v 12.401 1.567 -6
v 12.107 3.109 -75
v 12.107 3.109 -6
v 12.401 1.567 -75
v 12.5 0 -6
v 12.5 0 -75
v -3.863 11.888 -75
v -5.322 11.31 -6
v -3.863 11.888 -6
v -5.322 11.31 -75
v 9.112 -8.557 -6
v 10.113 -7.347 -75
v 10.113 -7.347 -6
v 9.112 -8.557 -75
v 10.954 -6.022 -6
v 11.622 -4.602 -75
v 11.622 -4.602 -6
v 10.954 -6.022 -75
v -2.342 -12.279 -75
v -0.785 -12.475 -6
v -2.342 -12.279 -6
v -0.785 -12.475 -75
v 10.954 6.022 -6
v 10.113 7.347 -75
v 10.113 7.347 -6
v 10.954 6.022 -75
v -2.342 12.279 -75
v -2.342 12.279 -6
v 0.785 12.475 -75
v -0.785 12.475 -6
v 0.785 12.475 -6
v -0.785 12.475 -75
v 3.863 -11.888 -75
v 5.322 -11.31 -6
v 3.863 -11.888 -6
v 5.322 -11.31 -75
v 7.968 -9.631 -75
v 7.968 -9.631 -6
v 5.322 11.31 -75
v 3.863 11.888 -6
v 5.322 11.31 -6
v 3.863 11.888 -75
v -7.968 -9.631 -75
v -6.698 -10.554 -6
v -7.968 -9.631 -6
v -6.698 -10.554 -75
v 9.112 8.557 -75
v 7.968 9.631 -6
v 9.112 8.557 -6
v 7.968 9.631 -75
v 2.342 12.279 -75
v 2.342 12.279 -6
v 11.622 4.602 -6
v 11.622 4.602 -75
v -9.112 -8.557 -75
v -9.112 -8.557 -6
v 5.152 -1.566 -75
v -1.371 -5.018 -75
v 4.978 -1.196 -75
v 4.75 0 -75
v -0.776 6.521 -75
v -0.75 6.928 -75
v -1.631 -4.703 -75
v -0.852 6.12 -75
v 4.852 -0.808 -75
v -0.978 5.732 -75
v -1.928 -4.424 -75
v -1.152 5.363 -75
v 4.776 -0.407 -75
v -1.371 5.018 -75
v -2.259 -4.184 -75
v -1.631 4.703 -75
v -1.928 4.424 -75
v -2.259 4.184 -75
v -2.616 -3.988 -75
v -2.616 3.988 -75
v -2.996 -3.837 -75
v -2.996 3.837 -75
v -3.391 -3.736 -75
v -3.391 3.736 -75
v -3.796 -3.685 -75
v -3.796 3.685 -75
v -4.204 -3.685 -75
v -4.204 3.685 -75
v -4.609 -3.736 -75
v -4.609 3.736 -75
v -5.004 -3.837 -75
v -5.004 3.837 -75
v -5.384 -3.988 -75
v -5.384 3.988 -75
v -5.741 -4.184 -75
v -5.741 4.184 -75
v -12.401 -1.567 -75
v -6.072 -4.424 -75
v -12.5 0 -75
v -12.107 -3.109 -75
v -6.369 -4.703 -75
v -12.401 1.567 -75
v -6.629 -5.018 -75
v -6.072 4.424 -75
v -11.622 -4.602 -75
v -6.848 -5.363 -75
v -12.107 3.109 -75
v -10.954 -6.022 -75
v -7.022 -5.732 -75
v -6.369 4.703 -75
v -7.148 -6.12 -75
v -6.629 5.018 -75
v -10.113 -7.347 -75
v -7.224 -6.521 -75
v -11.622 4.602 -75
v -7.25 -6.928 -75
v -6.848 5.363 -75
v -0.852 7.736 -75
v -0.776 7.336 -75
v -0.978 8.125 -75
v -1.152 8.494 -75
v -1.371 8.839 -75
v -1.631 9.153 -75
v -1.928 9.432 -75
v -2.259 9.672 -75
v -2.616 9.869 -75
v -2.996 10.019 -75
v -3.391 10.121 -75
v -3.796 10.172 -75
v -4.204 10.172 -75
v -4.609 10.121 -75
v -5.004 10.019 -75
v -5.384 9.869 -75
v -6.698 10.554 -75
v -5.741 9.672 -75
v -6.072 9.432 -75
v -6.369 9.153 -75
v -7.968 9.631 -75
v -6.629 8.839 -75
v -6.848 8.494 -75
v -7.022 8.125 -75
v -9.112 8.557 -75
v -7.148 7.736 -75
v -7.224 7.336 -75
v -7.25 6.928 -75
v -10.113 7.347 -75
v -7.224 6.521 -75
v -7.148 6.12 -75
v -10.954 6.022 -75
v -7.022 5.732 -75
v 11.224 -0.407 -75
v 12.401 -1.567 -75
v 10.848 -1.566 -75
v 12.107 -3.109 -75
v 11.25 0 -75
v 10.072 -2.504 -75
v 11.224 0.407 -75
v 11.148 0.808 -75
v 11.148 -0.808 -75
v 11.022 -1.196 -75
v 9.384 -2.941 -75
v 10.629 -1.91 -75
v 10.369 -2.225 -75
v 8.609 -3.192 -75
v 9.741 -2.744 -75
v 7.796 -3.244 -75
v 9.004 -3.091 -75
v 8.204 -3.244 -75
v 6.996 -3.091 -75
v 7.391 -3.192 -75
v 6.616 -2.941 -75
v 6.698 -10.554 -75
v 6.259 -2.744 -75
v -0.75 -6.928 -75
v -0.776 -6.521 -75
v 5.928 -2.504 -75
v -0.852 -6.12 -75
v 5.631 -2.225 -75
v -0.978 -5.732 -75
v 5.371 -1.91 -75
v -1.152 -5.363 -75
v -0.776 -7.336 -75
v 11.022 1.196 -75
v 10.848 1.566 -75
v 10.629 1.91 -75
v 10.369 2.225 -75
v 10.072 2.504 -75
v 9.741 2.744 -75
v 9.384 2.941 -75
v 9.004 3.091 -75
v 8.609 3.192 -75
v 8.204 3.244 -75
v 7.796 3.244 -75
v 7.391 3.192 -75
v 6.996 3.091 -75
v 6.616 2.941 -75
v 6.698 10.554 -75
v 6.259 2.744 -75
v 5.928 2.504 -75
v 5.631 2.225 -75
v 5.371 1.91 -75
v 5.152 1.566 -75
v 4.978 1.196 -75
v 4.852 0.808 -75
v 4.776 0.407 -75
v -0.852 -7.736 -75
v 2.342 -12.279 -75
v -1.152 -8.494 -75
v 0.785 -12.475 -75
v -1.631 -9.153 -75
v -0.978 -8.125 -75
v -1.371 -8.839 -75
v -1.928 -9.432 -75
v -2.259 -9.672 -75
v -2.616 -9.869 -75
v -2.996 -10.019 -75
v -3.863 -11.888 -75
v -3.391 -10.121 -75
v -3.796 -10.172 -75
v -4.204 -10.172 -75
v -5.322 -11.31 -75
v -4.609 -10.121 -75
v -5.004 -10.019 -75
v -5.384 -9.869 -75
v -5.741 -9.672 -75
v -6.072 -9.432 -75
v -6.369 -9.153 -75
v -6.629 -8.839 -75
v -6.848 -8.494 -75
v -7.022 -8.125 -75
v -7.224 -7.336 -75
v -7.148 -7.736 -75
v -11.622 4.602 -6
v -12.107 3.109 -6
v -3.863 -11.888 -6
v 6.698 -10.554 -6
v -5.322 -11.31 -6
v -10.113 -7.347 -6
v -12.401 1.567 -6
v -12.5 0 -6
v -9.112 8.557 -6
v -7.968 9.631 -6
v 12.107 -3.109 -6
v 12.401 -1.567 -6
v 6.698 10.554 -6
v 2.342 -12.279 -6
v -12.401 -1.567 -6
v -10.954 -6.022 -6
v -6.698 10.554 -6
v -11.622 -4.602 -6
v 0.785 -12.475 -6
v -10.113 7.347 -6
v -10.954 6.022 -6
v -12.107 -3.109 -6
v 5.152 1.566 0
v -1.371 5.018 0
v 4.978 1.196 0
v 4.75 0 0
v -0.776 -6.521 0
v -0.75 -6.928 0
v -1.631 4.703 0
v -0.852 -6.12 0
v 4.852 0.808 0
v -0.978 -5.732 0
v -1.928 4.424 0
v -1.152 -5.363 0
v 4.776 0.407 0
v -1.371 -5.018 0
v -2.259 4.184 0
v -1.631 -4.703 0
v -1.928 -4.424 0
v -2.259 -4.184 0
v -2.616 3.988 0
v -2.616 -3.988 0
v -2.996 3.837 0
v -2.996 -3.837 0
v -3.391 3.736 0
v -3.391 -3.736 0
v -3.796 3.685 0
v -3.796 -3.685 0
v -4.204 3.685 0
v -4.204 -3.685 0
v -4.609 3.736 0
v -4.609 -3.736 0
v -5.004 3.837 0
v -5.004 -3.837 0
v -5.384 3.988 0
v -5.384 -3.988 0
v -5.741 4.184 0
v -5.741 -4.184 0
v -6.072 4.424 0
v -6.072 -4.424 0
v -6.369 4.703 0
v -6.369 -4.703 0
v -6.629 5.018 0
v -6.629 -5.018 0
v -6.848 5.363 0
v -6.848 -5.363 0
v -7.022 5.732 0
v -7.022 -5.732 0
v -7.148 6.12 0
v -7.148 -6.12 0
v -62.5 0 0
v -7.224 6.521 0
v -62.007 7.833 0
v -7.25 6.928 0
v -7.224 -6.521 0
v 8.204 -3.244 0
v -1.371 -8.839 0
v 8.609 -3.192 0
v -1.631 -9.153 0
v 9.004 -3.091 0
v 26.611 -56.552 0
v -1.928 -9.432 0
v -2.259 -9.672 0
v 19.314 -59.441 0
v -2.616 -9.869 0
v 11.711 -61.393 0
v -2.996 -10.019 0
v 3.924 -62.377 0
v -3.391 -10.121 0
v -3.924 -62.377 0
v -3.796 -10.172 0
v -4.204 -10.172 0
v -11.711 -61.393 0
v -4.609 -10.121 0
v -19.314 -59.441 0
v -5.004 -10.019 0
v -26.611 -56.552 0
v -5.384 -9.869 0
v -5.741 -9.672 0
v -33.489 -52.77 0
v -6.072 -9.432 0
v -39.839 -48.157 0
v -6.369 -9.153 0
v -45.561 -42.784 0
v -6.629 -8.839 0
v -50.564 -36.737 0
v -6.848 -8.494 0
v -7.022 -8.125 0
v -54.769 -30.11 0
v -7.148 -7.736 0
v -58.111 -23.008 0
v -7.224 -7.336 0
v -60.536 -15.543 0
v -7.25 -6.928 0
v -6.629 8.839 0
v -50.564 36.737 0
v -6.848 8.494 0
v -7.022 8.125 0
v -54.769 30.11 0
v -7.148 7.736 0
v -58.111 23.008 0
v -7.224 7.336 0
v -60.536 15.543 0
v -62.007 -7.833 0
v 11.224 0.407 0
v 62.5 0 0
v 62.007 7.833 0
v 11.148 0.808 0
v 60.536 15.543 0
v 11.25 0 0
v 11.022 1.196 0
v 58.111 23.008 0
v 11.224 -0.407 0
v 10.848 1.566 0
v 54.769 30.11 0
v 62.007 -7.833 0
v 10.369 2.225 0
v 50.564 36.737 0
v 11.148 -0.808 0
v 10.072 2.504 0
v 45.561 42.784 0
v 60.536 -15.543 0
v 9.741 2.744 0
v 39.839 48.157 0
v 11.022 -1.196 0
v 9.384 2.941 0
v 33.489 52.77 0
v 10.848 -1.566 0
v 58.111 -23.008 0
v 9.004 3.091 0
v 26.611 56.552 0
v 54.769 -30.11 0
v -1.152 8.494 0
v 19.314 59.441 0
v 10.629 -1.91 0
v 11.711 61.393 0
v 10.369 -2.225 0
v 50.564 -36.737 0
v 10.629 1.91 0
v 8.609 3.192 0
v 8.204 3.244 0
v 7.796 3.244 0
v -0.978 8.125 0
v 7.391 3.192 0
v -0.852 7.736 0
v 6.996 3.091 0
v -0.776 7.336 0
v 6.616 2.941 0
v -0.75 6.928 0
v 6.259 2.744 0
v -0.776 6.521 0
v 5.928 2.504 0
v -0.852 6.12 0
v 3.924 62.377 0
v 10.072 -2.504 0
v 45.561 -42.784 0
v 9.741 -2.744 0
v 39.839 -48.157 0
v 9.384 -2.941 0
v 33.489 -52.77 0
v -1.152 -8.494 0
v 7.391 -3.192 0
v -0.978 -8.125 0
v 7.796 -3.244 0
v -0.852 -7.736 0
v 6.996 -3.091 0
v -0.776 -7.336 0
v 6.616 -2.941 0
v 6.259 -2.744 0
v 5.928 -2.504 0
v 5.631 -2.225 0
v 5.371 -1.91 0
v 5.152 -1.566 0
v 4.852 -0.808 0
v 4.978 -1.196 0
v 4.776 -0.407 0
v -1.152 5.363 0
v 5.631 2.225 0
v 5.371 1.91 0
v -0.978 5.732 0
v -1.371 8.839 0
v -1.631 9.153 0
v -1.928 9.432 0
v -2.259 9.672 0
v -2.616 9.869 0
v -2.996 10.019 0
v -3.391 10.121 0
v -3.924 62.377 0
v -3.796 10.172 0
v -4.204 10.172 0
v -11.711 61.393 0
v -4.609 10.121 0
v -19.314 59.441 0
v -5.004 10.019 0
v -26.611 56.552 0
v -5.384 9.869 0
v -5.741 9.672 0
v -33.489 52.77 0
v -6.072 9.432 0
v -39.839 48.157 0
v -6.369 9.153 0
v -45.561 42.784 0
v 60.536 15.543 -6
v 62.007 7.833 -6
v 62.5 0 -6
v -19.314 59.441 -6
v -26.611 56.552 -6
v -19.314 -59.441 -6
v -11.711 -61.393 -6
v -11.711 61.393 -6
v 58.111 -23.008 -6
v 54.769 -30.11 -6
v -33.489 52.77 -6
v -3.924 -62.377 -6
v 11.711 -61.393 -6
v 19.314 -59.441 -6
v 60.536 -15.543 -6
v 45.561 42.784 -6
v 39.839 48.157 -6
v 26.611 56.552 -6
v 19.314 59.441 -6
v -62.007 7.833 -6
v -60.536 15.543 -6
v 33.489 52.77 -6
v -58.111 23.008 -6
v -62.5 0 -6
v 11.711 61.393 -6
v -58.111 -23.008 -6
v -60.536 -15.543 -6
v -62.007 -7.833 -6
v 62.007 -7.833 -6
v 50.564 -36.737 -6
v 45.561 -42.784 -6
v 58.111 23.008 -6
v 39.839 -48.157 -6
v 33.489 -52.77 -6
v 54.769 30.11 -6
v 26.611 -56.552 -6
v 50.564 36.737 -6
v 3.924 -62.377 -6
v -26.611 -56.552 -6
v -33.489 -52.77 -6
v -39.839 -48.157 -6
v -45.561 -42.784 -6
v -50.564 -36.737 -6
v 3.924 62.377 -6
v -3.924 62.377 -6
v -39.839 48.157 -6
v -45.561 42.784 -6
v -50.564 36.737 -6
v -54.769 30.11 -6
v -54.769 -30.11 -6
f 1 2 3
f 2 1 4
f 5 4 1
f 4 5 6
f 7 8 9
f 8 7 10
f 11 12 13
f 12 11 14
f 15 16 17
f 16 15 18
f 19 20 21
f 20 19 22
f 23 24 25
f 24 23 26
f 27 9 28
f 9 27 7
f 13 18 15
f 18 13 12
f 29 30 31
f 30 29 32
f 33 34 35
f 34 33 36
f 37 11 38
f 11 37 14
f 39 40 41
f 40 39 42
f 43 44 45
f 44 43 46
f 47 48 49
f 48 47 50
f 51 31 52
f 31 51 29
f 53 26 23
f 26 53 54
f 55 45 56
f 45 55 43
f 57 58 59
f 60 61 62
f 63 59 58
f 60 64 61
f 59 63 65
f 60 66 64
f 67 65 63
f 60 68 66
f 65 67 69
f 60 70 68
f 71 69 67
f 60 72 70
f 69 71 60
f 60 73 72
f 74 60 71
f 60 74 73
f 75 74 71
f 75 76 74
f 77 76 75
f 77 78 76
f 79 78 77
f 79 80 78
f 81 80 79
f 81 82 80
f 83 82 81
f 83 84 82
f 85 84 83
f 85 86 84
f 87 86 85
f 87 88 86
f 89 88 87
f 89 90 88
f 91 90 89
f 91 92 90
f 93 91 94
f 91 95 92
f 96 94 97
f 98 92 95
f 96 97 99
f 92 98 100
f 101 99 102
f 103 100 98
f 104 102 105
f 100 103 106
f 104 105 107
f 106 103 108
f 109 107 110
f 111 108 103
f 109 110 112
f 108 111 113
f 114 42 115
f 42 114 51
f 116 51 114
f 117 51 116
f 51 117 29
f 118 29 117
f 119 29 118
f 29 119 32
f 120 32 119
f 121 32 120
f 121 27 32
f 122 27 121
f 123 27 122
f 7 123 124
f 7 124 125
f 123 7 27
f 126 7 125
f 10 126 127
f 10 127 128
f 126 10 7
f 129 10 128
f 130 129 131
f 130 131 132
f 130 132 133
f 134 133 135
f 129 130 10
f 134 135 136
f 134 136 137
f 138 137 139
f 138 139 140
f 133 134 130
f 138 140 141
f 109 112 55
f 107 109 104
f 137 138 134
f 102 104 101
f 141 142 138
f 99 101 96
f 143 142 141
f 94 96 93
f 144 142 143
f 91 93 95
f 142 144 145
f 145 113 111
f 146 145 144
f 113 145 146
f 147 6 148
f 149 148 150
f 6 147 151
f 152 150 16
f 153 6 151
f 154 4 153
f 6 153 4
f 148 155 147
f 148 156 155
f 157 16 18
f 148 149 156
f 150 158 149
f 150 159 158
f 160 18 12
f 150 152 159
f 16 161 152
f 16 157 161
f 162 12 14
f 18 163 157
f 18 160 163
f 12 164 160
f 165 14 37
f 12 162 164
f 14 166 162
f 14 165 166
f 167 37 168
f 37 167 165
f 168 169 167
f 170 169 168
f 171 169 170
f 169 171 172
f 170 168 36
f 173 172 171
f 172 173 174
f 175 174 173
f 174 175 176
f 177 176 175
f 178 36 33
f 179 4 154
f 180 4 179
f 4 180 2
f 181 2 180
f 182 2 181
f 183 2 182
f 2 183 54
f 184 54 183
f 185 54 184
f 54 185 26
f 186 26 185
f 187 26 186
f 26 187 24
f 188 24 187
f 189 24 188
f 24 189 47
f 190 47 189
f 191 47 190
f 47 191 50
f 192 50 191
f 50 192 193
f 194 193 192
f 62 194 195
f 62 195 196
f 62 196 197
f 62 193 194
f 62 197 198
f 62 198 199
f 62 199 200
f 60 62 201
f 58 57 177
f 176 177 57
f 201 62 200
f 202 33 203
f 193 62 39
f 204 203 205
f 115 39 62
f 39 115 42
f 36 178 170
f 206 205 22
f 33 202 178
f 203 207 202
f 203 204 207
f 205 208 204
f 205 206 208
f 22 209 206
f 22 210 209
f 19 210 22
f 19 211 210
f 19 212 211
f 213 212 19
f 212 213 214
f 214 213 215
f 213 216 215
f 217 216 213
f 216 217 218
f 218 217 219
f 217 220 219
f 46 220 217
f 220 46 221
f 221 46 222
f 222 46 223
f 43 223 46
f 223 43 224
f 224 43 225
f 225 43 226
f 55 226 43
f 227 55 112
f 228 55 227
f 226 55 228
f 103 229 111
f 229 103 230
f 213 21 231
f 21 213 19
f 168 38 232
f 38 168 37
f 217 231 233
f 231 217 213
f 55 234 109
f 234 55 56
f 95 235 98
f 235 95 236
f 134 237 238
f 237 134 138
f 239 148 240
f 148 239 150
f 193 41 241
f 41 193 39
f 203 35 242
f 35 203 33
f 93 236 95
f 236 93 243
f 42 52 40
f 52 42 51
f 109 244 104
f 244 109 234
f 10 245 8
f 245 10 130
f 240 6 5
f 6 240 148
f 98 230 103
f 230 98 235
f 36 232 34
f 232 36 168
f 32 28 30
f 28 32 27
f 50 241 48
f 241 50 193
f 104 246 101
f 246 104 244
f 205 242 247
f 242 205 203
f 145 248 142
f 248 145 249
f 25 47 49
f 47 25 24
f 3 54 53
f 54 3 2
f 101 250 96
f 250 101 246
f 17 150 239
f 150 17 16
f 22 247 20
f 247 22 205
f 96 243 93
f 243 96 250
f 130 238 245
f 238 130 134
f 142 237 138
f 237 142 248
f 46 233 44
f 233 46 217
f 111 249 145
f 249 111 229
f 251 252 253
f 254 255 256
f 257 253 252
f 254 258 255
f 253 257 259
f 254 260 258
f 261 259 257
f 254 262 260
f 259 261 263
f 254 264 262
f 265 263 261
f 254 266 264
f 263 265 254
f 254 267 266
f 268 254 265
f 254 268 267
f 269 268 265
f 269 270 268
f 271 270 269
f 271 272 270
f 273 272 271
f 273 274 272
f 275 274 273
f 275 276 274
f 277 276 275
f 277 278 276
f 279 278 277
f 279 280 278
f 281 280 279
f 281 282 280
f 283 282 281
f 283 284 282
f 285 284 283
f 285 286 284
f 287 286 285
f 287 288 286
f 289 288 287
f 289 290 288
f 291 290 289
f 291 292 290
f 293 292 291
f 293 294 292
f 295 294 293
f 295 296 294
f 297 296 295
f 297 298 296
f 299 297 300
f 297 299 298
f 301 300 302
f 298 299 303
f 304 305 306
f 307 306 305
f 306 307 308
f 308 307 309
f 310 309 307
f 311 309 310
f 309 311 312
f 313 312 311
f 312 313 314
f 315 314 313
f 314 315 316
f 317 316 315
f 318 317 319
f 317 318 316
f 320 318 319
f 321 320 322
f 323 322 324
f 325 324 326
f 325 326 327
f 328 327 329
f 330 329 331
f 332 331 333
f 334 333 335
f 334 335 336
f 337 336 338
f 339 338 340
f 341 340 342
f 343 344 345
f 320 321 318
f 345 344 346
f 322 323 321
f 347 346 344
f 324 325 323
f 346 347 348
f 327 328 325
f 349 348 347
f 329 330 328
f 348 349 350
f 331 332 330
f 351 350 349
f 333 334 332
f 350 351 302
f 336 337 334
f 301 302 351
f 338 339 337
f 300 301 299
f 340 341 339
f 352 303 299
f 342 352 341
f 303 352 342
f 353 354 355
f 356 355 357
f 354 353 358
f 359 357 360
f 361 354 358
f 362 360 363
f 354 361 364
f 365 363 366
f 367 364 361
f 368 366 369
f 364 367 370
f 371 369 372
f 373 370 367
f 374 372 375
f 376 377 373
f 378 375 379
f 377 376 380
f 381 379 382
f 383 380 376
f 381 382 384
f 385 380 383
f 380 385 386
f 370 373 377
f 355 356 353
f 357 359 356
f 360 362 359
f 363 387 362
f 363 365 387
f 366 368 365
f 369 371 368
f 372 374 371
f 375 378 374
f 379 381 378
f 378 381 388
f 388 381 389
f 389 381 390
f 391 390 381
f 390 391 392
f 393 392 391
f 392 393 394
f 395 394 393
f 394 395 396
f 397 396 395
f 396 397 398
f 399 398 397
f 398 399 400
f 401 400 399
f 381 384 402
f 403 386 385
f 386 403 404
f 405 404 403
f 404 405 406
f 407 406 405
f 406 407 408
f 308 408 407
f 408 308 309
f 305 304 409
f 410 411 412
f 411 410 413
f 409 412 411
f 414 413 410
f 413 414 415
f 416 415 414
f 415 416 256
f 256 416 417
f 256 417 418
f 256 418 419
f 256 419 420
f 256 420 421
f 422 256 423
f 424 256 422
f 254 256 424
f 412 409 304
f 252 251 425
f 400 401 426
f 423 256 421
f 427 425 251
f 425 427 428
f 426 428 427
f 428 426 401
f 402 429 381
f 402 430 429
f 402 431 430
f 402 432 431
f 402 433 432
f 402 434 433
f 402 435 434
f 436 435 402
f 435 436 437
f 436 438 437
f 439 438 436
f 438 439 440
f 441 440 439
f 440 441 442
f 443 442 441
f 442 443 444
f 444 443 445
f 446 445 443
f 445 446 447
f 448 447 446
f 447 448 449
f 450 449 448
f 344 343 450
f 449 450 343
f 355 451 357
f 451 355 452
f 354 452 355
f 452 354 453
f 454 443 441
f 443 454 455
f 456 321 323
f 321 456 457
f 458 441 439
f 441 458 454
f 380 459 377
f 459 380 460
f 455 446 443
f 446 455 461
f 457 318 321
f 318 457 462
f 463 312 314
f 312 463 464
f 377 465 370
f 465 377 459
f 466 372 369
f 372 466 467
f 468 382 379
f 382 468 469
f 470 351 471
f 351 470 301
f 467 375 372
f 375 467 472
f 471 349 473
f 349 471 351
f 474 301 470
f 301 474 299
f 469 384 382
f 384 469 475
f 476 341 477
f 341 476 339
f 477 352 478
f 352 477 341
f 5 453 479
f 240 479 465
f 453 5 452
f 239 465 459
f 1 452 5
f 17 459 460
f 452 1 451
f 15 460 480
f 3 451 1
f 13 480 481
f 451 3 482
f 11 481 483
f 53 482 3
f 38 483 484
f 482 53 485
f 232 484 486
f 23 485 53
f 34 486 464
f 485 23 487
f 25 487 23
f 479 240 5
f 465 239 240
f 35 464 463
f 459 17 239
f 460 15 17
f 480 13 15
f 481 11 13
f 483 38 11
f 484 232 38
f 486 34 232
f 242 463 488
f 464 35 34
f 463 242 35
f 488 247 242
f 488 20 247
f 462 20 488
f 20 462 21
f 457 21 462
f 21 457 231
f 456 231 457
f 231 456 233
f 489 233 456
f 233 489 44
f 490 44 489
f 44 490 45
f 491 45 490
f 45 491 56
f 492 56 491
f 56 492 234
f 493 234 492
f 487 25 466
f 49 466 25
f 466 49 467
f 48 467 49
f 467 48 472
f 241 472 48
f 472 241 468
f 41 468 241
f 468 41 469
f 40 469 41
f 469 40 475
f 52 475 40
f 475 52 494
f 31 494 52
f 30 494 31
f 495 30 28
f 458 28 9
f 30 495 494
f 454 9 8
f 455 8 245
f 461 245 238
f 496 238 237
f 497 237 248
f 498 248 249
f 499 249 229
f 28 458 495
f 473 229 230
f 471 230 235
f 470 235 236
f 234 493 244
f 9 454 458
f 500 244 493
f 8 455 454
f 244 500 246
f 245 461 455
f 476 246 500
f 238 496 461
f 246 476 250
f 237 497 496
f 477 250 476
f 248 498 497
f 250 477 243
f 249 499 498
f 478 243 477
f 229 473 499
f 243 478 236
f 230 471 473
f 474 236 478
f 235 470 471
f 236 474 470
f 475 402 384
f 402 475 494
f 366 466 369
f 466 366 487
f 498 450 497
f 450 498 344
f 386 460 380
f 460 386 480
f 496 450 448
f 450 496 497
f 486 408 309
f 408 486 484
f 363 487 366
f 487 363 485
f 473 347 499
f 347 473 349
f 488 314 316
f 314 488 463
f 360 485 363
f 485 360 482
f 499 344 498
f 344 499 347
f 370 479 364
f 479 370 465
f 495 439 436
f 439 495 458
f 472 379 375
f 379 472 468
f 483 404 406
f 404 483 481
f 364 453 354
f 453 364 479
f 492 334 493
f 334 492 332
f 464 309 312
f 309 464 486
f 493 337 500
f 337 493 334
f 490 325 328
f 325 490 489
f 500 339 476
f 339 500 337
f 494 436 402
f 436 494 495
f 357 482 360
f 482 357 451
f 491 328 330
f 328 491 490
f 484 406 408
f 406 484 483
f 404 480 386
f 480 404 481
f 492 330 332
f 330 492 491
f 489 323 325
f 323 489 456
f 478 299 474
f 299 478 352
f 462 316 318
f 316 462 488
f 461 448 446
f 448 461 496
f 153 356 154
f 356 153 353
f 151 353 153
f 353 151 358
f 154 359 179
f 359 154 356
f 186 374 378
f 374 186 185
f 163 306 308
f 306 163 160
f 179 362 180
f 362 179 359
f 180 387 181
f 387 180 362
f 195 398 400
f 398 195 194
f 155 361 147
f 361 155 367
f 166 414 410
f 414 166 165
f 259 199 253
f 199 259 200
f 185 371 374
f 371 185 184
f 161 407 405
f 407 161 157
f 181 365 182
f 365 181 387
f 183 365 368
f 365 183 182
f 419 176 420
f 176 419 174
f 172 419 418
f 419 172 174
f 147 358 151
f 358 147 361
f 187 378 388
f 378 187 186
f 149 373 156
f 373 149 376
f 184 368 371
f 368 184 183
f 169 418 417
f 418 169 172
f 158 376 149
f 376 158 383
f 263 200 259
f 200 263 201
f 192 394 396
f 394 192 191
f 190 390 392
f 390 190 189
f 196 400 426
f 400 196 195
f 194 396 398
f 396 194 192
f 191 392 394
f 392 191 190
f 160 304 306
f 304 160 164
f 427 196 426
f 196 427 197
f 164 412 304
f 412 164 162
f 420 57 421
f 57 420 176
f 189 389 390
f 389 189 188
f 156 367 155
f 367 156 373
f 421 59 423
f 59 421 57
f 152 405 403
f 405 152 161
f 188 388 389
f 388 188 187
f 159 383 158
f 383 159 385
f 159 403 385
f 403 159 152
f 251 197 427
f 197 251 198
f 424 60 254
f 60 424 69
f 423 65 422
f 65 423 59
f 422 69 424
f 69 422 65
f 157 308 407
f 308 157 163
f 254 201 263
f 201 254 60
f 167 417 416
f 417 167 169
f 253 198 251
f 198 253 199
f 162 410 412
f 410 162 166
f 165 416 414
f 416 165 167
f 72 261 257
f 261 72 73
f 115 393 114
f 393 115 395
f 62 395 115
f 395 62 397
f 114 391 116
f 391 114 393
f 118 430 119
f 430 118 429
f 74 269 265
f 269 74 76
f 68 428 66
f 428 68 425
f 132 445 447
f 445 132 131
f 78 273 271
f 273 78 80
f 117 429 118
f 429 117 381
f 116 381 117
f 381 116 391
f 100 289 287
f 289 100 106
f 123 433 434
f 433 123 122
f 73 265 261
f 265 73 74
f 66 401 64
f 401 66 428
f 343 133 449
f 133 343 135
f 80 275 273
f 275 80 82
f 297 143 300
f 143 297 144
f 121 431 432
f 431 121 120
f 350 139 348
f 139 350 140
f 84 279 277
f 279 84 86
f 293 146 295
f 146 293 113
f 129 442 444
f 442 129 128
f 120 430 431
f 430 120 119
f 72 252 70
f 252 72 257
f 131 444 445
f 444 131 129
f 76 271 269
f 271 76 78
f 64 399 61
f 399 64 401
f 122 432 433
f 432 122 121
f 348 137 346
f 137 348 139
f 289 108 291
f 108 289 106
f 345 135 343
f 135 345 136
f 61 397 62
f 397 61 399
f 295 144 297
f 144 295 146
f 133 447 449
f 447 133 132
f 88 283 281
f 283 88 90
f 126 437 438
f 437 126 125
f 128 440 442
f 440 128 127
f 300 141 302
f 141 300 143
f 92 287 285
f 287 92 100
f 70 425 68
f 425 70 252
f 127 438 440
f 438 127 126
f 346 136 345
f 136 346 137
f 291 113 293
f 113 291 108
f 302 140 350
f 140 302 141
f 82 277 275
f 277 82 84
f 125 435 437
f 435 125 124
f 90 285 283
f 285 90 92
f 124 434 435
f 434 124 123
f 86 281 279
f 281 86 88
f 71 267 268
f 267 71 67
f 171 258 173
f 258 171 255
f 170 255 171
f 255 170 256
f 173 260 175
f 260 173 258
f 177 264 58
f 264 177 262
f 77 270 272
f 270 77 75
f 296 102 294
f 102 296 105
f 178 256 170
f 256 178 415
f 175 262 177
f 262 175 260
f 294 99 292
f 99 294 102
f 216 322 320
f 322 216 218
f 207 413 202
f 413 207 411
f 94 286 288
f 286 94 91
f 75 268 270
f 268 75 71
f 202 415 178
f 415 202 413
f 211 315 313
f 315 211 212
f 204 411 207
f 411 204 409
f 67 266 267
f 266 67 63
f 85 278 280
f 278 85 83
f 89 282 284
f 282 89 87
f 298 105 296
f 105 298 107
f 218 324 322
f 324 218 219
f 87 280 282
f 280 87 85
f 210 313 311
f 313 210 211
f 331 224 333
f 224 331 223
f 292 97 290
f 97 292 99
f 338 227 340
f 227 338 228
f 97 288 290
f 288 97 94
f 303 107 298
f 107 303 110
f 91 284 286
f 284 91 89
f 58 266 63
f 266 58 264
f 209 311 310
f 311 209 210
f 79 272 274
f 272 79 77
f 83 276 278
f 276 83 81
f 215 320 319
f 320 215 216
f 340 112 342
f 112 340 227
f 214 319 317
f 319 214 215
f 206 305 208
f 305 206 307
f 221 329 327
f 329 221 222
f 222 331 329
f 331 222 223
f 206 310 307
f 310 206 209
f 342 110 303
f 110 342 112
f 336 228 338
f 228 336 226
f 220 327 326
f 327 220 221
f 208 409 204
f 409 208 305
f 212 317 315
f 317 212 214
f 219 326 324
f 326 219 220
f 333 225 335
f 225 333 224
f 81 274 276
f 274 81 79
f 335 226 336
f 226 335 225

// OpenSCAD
$fn = 50;


difference() {
	union() {
		translate(v = [0, 0, -75.0000000000]) {
			cylinder(h = 75, r = 12.5000000000);
		}
		translate(v = [0, 0, -6.0000000000]) {
			cylinder(h = 6, r = 62.5000000000);
		}
	}
	union() {
		#translate(v = [8.0000000000, 0.0000000000, -75]) {
			cylinder(h = 75, r = 3.2500000000);
		}
		#translate(v = [-4.0000000000, 6.9282032303, -75]) {
			cylinder(h = 75, r = 3.2500000000);
		}
		#translate(v = [-4.0000000000, -6.9282032303, -75]) {
			cylinder(h = 75, r = 3.2500000000);
		}
	}
}
